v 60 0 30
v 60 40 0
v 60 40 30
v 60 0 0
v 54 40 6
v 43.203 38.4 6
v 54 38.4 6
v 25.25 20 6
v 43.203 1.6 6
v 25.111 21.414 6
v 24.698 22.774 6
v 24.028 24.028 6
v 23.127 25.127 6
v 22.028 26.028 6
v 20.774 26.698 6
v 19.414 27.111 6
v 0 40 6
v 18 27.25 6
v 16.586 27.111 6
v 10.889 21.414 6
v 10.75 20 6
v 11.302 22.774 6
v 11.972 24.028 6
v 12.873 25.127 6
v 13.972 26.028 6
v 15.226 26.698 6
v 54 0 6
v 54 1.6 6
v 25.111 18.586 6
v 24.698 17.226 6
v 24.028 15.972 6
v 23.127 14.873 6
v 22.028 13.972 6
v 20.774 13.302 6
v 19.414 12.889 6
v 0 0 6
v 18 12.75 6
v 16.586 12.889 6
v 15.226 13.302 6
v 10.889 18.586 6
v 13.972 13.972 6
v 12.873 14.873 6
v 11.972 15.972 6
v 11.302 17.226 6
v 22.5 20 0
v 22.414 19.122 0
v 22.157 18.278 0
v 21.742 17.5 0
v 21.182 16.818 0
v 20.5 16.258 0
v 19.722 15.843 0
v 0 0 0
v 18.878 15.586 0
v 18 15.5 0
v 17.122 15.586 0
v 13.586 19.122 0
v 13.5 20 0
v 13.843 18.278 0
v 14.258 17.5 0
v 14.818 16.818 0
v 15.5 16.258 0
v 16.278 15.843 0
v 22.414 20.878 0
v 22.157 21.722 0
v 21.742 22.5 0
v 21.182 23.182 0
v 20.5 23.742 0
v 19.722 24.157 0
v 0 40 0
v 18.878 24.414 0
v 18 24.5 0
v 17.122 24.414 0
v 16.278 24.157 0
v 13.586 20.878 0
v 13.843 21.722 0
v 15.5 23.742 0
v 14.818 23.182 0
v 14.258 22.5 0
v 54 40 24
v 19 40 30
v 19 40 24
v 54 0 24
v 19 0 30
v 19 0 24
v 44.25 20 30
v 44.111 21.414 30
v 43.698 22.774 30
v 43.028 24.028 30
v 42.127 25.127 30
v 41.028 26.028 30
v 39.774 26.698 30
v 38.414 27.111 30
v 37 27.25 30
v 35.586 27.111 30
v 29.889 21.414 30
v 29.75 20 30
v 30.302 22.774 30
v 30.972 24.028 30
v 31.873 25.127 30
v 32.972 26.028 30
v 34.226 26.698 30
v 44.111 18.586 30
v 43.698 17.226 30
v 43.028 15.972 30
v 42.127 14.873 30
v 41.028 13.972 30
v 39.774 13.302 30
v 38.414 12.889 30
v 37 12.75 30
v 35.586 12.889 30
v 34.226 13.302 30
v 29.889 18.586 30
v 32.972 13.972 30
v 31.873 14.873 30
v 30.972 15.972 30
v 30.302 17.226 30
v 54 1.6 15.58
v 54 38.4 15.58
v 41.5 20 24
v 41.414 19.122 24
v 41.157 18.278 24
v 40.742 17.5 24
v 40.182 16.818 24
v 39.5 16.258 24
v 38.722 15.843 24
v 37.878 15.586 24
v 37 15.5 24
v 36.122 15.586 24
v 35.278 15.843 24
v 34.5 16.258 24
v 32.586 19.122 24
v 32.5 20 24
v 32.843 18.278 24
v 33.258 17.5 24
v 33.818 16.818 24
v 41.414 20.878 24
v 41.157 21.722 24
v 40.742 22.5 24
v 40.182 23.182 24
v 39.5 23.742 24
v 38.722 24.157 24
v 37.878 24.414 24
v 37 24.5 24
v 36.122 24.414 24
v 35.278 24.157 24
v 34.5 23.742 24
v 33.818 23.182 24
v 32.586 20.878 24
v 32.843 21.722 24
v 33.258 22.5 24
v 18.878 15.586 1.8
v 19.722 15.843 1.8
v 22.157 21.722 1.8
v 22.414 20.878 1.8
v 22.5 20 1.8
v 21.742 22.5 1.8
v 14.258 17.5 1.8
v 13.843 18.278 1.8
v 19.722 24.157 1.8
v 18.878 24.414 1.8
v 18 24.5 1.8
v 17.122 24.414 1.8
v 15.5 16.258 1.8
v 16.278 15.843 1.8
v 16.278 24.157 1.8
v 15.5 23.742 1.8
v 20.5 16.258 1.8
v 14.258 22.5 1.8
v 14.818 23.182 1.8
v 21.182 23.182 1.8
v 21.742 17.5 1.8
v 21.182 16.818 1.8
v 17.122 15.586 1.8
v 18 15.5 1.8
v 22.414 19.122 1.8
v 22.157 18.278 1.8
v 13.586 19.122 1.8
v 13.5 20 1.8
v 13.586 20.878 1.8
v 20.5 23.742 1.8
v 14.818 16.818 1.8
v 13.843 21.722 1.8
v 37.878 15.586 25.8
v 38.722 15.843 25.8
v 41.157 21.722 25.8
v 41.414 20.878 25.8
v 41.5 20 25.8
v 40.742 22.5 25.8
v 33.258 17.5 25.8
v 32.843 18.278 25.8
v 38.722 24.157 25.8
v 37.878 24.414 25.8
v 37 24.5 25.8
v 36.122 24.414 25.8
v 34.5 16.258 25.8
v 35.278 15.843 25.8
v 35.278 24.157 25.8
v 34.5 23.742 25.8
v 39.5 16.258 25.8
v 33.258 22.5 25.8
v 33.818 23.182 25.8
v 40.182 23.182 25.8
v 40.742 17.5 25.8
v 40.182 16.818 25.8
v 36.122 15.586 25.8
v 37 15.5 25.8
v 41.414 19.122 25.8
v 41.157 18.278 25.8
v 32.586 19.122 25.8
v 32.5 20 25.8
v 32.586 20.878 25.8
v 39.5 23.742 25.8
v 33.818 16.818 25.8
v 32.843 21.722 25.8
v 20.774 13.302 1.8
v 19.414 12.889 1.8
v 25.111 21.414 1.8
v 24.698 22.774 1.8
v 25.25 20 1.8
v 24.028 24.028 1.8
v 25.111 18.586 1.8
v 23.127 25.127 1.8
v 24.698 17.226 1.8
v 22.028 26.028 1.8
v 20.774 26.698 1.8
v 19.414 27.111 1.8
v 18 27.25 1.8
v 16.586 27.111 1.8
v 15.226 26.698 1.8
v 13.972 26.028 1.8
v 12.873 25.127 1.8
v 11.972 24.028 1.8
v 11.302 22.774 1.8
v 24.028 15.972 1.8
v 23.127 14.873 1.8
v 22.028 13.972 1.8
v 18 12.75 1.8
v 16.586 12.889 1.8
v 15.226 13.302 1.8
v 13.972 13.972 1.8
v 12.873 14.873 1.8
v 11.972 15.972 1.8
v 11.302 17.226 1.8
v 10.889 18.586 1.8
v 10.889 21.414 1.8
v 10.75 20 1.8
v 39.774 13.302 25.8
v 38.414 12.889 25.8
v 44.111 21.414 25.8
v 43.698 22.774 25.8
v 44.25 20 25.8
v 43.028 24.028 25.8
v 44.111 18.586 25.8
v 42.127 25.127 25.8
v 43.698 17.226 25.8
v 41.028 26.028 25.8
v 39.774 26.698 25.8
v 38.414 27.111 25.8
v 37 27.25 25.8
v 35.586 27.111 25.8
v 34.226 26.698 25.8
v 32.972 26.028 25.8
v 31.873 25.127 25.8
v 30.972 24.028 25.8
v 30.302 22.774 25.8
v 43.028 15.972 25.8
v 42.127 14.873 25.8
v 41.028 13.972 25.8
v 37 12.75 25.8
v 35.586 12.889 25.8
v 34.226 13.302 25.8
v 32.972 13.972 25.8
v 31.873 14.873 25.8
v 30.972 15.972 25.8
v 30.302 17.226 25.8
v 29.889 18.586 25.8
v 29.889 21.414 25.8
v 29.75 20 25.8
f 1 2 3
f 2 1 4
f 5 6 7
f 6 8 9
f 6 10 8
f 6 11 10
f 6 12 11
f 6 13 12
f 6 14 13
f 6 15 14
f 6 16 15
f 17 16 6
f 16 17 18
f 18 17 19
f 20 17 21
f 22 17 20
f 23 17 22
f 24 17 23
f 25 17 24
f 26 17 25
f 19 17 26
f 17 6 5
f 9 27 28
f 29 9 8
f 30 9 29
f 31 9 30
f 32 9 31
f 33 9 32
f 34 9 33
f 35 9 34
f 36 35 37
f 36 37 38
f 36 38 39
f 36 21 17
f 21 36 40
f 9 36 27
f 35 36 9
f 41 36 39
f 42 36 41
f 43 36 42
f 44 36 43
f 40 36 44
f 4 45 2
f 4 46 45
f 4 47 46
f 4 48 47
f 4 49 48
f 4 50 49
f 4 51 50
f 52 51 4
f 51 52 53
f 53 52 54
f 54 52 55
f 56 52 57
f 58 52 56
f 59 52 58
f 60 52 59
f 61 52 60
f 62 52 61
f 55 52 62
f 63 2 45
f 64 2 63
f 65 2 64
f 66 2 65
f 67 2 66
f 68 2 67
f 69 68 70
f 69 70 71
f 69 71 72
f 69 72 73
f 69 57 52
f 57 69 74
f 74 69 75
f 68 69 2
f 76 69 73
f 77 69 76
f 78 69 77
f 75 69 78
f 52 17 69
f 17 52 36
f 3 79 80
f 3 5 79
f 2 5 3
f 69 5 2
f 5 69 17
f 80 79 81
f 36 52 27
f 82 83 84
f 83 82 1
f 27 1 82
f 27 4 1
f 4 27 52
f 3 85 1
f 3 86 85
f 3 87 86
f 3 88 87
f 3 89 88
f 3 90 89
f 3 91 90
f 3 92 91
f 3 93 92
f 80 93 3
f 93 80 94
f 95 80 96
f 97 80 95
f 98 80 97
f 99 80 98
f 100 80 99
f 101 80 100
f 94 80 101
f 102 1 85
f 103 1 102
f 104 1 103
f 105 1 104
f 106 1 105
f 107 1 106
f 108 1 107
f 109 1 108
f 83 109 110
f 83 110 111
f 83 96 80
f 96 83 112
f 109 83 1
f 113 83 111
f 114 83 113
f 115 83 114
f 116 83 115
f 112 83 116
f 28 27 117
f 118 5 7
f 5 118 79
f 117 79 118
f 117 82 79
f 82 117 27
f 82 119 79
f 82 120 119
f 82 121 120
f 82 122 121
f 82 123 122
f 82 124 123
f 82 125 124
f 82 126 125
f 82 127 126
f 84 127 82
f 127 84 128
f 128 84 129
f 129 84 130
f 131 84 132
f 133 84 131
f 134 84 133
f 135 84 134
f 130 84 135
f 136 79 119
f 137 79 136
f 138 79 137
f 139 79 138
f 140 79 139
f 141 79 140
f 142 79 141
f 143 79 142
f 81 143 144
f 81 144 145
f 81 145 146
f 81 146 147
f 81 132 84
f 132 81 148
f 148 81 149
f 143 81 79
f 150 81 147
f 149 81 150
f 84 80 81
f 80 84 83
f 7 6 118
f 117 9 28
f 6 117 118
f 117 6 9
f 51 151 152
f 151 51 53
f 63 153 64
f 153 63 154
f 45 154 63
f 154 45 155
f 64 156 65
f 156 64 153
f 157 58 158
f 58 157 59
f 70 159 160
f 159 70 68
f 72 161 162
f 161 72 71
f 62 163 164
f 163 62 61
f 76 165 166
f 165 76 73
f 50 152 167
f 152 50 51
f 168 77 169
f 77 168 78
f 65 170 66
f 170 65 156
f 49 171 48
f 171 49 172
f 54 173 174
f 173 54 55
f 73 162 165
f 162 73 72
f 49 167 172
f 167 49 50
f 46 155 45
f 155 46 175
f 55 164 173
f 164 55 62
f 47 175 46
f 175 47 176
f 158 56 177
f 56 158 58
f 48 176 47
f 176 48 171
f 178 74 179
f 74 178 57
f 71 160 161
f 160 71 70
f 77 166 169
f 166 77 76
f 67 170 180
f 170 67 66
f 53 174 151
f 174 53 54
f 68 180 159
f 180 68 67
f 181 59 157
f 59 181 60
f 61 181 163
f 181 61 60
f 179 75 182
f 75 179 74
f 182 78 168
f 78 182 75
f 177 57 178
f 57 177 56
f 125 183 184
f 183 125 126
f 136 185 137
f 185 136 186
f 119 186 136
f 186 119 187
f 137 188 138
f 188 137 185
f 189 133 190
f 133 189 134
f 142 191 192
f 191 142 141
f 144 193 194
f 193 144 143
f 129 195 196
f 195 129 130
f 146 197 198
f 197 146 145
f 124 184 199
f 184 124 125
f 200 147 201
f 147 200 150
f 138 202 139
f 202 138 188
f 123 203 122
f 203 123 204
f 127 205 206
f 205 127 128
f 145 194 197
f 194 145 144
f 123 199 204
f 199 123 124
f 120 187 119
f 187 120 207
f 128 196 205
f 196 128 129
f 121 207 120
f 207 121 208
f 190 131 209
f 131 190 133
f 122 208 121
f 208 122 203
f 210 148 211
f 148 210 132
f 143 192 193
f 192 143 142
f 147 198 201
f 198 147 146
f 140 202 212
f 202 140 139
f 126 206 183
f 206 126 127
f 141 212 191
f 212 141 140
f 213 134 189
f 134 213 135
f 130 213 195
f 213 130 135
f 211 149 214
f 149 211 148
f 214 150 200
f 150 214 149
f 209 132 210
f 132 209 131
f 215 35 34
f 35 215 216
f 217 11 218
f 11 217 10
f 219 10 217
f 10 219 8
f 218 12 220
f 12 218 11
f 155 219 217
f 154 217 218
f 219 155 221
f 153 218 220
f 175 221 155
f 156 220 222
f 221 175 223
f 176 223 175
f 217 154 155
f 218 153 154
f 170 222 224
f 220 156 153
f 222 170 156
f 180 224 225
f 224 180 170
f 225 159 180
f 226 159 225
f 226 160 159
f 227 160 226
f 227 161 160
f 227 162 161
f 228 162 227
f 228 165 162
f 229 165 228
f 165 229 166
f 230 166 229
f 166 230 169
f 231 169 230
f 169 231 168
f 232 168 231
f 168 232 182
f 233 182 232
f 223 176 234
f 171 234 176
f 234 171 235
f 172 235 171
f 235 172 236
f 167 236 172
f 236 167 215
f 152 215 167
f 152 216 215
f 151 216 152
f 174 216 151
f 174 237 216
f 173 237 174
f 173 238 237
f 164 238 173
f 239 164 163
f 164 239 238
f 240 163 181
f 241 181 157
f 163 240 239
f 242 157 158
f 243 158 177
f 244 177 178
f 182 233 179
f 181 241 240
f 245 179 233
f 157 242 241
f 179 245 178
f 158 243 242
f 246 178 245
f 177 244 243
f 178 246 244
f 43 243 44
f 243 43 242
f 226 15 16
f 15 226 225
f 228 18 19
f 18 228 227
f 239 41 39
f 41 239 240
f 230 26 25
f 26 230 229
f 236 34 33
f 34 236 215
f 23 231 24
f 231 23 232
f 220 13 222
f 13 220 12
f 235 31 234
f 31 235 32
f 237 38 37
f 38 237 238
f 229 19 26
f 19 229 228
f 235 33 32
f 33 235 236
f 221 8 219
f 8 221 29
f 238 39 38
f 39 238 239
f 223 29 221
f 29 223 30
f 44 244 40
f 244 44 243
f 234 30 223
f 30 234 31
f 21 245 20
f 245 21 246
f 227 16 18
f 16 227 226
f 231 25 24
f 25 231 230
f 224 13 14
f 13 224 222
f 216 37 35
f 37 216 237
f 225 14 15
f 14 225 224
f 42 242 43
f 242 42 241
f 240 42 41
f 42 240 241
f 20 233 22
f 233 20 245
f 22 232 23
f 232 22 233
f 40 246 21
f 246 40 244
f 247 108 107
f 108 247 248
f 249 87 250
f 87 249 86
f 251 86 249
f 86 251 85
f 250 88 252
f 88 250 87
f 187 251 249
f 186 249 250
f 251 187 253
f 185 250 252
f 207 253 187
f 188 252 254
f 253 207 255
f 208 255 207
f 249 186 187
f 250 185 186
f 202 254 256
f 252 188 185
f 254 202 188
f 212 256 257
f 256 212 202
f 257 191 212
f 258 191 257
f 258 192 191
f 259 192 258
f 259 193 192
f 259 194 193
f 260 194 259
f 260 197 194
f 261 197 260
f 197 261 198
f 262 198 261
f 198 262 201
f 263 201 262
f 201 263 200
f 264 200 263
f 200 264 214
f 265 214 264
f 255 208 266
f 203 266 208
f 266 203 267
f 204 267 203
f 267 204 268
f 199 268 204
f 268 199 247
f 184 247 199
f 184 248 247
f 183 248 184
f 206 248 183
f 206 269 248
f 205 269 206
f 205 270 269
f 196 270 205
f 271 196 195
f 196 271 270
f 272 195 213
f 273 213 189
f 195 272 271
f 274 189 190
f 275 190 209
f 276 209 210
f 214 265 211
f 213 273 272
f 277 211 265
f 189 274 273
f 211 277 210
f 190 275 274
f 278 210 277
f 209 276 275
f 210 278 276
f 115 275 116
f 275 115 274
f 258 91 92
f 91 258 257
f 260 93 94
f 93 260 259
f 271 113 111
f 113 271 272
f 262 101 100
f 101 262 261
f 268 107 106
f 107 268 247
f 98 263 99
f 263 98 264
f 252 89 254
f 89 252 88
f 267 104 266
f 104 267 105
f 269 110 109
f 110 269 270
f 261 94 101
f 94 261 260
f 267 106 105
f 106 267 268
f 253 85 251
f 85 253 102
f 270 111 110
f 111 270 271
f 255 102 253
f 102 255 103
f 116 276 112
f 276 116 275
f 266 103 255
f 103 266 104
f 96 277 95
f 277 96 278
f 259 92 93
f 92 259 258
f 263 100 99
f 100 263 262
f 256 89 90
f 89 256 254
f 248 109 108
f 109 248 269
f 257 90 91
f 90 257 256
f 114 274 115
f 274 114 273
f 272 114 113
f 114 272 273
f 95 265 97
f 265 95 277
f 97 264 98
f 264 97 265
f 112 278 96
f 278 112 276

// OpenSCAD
$fn = 32;

// ----------------------------------------------------------------------
// Z-bracket: 60 x 40 x 30 mm
// ----------------------------------------------------------------------

// --- parameters (mm) ---
lower_leg = 60;           // lower foot length, X
upper_leg = 35;           // upper foot length, X
bracket_w = 40;           // bracket width, Y
offset_h = 30;            // overall rise, Z
sheet_t = 6;              // plate thickness
hole_d = 9;               // clearance for M8
cb_d = 14.5;              // counterbore diameter
cb_h = 4.2;               // counterbore depth
rib_len = 12.6;           // gusset leg
rib_sink = 1.6;           // gusset overlap into the plates

module hole_z(px, py, z0) {
  translate([px, py, z0 - 2.5]) cylinder(h = sheet_t + 5, d = hole_d);
}
module hole_x(py, pz) {
  translate([-2.5, py, pz]) rotate([0, 90, 0]) cylinder(h = sheet_t + 5, d = hole_d);
}
module cb_z(px, py, top_z) {
  translate([px, py, top_z - cb_h]) cylinder(h = cb_h + 0.5, d = cb_d);
}
module cb_x(py, pz) {
  translate([sheet_t - cb_h, py, pz]) rotate([0, -90, 0]) cylinder(h = cb_h + 0.5, d = cb_d);
}
module gusset(x0) {
  translate([x0, bracket_w - rib_sink, 0])
    rotate([90, 0, 0])
      linear_extrude(height = bracket_w - 2 * rib_sink)
        polygon(points = [[rib_sink, sheet_t - rib_sink],
                          [rib_sink, sheet_t - rib_sink + rib_len],
                          [-rib_len, sheet_t - rib_sink]]);
}

difference() {
  union() {
    cube([lower_leg, bracket_w, sheet_t]);
    /* web, overlapping the lower foot */
    translate([lower_leg - sheet_t, 0, 0]) cube([sheet_t, bracket_w, offset_h]);
    /* upper foot, sunk into the web */
    translate([lower_leg - sheet_t - upper_leg, 0, offset_h - sheet_t]) cube([upper_leg + sheet_t, bracket_w, sheet_t]);
    gusset(lower_leg - sheet_t);
  }
  hole_z(18, 20, 0);
  translate([lower_leg - sheet_t - 17, 0, 0]) hole_z(0, 20, offset_h - sheet_t);
  cb_z(18, 20, sheet_t);
  translate([lower_leg - sheet_t - 17, 0, 0]) cb_z(0, 20, offset_h);
}
